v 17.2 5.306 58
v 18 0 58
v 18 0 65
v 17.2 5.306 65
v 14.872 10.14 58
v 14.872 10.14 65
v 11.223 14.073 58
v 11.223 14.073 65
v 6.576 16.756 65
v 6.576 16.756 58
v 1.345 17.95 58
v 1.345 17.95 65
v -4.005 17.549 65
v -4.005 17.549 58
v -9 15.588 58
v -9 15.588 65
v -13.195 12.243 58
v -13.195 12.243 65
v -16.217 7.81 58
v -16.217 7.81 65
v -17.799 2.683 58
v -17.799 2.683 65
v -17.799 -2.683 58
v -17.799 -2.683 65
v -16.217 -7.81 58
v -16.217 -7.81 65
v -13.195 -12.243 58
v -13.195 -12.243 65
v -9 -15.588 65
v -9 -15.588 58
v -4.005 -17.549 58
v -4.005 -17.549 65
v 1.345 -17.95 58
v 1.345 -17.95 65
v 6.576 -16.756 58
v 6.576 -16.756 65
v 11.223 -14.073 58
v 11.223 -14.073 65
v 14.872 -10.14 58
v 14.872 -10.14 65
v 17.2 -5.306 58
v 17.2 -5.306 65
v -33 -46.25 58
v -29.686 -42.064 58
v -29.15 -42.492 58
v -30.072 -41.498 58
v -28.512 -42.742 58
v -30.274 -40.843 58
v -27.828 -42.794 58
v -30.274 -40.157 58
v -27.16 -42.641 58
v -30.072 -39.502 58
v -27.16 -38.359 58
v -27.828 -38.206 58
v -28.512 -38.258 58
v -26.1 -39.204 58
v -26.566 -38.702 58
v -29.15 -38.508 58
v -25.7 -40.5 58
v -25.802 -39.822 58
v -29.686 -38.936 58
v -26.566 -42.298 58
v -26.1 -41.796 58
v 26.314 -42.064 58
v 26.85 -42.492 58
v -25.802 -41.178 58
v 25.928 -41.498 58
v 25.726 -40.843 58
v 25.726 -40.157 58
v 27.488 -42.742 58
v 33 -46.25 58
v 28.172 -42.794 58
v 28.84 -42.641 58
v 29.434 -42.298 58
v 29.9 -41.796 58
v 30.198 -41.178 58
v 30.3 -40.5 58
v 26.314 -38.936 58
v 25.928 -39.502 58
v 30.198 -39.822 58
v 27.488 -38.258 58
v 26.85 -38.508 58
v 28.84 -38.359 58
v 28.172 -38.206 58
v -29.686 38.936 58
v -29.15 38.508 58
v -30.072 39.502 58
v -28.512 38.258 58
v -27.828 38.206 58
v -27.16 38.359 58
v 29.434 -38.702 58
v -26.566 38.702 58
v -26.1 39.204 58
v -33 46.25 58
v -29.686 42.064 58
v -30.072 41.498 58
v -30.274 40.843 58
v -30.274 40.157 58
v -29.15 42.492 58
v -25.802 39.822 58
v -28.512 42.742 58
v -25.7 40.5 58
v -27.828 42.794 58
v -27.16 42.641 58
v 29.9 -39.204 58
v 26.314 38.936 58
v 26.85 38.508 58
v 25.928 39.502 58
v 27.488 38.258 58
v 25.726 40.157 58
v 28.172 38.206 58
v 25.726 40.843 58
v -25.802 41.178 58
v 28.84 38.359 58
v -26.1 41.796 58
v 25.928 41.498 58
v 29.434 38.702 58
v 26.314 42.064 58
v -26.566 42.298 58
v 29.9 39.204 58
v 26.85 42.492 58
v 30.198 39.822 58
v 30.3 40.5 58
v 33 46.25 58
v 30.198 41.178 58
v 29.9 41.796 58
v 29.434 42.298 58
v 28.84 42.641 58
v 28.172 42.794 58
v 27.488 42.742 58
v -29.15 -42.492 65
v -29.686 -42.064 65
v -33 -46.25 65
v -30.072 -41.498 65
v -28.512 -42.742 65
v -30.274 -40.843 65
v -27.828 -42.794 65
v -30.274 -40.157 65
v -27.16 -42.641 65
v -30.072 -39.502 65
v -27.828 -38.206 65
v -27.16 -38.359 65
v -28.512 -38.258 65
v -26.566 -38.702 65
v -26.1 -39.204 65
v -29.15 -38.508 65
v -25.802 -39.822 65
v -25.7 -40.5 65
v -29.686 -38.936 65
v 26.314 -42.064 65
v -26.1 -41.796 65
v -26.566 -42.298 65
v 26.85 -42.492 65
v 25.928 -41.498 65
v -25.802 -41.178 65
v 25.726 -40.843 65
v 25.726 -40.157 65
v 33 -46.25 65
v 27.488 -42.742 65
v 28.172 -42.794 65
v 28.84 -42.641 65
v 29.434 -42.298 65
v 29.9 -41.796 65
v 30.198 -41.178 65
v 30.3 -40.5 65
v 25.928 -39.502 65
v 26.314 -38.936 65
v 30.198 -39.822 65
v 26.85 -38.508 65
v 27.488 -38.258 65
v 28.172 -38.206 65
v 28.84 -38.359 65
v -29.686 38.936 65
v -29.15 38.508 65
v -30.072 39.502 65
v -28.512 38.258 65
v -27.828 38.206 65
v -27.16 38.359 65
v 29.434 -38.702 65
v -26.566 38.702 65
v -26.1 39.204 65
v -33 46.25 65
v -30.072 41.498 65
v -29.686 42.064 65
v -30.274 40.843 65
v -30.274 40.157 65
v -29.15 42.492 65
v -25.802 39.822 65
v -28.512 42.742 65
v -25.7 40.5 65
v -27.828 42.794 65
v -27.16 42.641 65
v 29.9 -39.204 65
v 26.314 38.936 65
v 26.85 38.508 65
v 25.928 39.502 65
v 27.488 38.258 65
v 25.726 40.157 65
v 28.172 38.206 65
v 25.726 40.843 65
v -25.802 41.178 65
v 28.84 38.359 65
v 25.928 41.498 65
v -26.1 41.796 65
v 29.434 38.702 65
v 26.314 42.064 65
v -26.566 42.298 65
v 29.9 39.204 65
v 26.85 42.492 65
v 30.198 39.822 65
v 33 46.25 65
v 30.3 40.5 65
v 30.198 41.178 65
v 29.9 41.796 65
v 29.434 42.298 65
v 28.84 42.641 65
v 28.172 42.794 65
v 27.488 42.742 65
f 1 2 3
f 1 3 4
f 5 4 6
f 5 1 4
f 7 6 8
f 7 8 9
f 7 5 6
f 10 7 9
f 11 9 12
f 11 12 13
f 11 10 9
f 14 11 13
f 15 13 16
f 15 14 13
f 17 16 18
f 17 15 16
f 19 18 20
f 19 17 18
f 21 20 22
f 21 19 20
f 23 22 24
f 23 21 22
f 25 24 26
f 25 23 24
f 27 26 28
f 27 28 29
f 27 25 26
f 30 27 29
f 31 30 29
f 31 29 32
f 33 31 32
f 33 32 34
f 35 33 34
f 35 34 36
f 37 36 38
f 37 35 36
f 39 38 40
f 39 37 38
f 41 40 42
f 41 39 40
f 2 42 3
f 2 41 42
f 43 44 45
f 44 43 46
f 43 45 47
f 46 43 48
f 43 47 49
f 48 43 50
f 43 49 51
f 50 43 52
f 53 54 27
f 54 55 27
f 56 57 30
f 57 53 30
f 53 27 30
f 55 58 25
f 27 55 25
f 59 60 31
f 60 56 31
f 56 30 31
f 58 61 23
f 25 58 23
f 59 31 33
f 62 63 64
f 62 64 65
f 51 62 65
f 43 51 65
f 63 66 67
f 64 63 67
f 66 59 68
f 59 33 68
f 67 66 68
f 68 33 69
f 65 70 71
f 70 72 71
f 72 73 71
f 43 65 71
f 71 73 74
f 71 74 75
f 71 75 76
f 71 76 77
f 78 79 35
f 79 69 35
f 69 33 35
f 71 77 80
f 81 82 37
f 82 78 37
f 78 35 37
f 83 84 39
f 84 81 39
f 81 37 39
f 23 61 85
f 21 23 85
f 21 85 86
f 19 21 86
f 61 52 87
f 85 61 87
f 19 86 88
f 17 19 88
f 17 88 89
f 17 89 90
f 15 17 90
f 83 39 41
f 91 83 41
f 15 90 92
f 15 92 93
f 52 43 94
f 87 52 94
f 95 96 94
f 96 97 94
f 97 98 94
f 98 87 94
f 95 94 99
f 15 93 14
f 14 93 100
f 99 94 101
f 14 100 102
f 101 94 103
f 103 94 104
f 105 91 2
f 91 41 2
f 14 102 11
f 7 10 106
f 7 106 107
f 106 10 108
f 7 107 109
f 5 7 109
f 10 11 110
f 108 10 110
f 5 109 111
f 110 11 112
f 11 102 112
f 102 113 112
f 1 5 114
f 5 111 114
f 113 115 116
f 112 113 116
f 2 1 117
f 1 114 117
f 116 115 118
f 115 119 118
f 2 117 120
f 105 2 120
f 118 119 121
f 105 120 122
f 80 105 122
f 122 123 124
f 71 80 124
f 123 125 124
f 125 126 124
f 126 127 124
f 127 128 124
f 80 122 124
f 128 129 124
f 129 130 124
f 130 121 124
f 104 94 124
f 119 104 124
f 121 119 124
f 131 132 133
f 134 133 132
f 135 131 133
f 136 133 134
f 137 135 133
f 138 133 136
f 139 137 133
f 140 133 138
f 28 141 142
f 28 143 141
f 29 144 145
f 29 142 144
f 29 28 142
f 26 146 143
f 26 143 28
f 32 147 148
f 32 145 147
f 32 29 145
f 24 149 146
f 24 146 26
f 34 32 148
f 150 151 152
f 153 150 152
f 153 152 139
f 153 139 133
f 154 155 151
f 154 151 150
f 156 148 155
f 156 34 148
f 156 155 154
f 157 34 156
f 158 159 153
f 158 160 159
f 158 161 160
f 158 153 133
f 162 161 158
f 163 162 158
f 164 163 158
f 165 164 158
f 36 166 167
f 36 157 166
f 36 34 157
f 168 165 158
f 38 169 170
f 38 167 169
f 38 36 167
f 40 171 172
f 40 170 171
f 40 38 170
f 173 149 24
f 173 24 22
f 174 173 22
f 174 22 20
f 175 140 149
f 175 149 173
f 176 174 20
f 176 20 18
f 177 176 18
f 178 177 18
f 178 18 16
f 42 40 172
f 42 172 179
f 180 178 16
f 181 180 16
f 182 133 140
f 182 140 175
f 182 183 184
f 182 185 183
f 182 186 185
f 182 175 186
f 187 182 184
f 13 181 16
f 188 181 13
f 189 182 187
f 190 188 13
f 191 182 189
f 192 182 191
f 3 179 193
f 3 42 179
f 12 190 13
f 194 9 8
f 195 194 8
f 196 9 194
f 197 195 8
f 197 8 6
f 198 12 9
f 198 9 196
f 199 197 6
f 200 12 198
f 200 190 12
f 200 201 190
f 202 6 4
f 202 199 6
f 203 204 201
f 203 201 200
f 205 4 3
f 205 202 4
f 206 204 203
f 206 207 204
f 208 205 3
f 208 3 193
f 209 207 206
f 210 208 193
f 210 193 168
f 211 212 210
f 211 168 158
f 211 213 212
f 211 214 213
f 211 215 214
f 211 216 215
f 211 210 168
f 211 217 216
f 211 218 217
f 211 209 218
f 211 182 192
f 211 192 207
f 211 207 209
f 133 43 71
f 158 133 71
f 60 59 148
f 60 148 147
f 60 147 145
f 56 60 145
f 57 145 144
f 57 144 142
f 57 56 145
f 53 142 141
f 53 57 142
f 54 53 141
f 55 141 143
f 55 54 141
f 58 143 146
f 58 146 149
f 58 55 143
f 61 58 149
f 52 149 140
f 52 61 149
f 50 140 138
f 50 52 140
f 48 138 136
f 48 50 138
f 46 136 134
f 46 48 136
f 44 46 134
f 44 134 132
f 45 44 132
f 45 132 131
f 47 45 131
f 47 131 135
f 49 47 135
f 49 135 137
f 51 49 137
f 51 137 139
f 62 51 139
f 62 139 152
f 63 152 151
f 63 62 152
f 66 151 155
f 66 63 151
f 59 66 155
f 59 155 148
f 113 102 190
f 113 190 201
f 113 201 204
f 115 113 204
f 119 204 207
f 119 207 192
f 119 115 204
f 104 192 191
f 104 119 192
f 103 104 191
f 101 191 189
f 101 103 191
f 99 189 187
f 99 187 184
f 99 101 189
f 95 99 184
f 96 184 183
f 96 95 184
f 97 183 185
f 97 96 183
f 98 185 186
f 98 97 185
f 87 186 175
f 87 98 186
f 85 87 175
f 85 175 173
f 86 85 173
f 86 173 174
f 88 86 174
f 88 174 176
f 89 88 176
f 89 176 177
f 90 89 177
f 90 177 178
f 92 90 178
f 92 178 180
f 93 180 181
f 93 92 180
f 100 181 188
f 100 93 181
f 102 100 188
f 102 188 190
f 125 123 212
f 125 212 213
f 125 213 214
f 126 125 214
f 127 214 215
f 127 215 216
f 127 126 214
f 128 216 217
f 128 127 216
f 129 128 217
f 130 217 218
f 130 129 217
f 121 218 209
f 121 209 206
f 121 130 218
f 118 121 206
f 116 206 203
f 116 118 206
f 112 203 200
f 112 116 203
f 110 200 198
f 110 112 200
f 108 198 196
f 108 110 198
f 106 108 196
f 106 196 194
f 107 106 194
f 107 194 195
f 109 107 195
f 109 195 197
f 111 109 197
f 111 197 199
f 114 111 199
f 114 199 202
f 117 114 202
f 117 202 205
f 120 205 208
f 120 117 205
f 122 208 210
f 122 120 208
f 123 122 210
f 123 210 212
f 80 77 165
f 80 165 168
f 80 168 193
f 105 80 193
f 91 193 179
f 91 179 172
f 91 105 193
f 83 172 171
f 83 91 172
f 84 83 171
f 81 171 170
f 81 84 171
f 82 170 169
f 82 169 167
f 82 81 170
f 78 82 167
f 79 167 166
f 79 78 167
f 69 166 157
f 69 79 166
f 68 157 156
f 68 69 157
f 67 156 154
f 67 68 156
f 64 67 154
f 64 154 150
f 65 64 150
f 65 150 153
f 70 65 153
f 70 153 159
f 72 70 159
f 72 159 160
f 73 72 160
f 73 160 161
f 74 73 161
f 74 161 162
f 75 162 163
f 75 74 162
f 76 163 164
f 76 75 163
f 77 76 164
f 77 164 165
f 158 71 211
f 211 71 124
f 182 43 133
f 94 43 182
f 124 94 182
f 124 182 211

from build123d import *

# Parameters (mm, degrees)
UPPER_START               = 58
SKETCH1_W                 = 66
SKETCH1_H                 = 92.5
SKETCH1_R                 = 18
SKETCH1_R_2               = 2.3
UPPER_BEARING_PLATE_DEPTH = 7


with BuildPart() as part:
    # Sketch1 → Upper bearing plate (new body)
    with BuildSketch(Plane.XY.offset(UPPER_START)):
        Rectangle(SKETCH1_W, SKETCH1_H)
        Circle(SKETCH1_R, mode=Mode.SUBTRACT)
        with Locations((-28, -40.5)):
            Circle(SKETCH1_R_2, mode=Mode.SUBTRACT)
        with Locations((-28, 40.5)):
            Circle(SKETCH1_R_2, mode=Mode.SUBTRACT)
        with Locations((28, -40.5)):
            Circle(SKETCH1_R_2, mode=Mode.SUBTRACT)
        with Locations((28, 40.5)):
            Circle(SKETCH1_R_2, mode=Mode.SUBTRACT)
    extrude(amount=UPPER_BEARING_PLATE_DEPTH)


solid = part.part
